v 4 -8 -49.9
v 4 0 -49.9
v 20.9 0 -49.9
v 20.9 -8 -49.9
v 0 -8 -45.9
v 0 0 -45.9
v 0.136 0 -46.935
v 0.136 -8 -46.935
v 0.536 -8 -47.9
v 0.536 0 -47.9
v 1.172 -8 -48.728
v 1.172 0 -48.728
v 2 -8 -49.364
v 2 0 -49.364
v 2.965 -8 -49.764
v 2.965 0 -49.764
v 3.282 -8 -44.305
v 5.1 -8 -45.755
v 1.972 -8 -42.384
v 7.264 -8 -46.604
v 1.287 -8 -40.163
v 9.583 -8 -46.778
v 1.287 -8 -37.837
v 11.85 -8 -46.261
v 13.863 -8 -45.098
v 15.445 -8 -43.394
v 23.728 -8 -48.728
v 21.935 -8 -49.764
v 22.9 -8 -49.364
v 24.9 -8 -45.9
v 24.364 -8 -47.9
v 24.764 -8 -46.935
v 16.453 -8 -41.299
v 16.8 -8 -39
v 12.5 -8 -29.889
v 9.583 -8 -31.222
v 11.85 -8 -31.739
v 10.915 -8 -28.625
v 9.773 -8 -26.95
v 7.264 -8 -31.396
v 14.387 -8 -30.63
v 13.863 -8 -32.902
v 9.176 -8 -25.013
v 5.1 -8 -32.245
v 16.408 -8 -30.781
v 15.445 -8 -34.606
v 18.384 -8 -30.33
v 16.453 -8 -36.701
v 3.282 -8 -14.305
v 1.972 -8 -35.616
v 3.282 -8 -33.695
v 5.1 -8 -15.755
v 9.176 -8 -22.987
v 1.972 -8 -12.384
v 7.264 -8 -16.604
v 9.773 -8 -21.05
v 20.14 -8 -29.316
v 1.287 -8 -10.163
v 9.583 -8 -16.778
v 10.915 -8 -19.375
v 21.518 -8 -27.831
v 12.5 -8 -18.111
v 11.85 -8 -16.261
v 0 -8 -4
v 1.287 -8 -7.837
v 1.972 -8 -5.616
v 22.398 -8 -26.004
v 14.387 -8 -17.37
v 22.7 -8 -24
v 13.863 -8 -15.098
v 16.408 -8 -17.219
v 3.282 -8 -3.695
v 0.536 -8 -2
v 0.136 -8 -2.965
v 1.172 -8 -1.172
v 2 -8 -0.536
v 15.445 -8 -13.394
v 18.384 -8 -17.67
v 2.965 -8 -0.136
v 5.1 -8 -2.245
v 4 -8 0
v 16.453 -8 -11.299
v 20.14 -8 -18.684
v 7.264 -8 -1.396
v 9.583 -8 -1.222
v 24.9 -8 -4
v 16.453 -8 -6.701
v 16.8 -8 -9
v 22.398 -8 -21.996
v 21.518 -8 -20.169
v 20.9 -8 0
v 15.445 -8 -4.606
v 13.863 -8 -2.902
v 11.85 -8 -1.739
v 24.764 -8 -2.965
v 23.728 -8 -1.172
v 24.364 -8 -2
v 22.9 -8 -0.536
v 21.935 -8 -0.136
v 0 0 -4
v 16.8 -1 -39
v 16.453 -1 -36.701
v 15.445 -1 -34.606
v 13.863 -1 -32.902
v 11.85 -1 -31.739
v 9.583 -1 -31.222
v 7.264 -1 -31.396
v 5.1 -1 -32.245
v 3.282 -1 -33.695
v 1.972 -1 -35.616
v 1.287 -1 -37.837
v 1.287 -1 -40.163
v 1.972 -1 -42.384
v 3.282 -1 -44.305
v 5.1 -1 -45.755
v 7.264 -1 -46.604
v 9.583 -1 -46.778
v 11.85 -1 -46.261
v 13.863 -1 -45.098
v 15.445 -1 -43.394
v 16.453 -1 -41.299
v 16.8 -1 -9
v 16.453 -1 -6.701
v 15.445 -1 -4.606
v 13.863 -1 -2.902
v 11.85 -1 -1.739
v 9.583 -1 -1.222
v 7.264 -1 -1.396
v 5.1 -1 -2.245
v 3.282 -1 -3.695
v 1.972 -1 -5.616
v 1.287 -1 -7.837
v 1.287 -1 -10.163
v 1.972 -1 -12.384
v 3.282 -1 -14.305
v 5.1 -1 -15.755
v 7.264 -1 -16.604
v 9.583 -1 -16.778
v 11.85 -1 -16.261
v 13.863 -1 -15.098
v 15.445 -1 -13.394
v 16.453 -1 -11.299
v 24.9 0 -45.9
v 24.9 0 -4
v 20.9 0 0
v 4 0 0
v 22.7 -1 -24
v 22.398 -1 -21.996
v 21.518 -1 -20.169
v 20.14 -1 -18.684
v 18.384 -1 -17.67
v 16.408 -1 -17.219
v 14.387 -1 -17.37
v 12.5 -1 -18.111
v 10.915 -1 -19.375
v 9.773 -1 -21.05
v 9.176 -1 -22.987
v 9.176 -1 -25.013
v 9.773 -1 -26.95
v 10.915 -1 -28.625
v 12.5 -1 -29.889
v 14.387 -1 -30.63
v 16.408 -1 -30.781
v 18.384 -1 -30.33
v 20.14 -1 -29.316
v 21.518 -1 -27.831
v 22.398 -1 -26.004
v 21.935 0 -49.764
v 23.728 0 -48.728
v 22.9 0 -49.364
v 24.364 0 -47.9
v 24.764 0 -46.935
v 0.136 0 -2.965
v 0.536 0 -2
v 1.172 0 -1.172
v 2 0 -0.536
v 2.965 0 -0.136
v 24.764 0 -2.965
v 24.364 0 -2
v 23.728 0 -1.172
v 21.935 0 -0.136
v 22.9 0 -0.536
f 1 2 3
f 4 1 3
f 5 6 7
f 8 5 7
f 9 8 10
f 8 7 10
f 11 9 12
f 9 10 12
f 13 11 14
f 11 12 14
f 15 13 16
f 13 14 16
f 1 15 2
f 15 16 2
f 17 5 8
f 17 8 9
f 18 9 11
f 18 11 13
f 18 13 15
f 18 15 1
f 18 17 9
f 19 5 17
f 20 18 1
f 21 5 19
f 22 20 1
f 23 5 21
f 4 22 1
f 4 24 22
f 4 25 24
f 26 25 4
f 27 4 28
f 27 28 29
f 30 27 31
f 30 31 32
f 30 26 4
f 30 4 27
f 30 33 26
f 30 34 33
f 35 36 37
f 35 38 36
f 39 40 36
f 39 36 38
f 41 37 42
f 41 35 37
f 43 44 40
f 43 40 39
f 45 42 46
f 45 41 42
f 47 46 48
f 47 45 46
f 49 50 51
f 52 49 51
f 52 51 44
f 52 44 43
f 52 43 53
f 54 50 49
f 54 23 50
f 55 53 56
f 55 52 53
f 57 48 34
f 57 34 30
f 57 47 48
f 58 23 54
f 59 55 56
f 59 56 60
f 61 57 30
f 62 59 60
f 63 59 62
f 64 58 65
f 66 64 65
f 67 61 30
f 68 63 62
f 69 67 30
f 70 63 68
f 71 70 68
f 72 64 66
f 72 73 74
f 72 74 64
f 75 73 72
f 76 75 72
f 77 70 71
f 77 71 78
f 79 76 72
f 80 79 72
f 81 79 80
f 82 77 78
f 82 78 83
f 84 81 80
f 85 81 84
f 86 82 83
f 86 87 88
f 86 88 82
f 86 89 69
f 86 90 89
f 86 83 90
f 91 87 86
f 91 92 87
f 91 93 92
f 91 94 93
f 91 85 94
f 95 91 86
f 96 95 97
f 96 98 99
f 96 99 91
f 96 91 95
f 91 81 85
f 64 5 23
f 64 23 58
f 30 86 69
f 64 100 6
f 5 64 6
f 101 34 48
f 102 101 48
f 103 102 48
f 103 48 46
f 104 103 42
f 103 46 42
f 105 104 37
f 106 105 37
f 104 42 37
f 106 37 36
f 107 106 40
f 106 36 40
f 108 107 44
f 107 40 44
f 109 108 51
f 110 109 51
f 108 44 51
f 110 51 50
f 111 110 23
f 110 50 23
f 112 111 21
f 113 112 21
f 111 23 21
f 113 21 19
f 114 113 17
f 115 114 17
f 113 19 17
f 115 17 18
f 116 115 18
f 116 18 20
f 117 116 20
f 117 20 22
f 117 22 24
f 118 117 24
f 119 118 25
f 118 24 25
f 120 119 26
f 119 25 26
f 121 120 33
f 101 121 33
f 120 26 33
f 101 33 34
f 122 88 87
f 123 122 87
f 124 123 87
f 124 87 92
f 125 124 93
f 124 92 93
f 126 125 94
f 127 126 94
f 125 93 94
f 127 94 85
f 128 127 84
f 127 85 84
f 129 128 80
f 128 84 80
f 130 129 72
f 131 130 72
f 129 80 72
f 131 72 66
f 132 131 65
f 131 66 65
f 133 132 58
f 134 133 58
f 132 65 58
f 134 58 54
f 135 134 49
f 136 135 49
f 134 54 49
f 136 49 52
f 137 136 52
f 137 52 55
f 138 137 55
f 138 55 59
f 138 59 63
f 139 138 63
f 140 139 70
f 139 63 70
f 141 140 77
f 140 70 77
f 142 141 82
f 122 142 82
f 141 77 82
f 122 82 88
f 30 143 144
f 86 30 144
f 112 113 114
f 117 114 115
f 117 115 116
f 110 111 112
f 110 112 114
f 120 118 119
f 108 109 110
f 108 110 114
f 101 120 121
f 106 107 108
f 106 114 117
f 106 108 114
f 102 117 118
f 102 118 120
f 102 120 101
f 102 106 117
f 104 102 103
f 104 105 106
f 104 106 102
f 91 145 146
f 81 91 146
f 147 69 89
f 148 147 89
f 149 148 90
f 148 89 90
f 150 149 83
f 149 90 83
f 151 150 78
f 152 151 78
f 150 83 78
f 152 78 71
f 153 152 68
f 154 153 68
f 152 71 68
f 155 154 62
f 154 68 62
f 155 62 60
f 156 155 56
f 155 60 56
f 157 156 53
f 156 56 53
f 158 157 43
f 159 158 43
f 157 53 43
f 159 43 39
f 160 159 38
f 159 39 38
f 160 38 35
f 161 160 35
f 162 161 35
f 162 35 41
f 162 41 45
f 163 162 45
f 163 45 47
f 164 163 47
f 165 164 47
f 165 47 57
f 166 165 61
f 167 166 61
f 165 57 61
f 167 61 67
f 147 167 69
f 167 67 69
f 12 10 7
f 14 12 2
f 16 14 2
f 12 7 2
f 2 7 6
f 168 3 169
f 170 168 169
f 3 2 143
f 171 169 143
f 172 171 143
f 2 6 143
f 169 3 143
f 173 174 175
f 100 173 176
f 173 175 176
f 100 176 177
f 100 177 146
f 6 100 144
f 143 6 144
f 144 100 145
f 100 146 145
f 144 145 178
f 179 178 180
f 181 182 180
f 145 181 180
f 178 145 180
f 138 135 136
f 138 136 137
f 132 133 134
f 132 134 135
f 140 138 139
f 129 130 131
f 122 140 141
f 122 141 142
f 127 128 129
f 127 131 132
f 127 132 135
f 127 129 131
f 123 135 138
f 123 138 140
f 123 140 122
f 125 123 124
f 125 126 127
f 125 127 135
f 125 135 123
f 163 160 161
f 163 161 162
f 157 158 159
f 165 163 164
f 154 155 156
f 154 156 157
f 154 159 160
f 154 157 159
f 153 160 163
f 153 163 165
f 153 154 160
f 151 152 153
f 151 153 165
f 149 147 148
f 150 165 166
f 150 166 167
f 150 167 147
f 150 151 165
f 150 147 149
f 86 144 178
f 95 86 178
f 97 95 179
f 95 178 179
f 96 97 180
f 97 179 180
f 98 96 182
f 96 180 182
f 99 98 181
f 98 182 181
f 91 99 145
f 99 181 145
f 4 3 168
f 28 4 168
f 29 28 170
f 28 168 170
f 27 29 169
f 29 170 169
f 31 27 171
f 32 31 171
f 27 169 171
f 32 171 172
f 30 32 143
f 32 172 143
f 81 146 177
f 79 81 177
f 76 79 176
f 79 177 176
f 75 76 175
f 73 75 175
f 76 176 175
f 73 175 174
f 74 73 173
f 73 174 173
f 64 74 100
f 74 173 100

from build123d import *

# Parameters (mm, degrees)
F1_DEPTH = 8
F2_R     = 7.8
F2_R_2   = 6.8
F3_DEPTH = 7


with BuildPart() as f1:
    # F0 (on Front) → F1 (new body)
    with BuildSketch(Plane.XZ):
        with BuildLine():
            Line((20.9, 0), (4, 0))
            ThreePointArc((4, 0), (1.171573, -1.171573), (0, -4))
            Line((0, -4), (0, -45.9))
            ThreePointArc((0, -45.9), (1.171573, -48.728427), (4, -49.9))
            Line((4, -49.9), (20.9, -49.9))
            ThreePointArc((20.9, -49.9), (23.728427, -48.728427), (24.9, -45.9))
            Line((24.9, -45.9), (24.9, -4))
            ThreePointArc((24.9, -4), (23.728427, -1.171573), (20.9, 0))
        make_face()
    extrude(amount=F1_DEPTH)

    # F2 (on face) → F3 (cut)
    with BuildSketch(Plane.XZ.offset(8)):
        with Locations((9, -9)):
            Circle(F2_R)
        with Locations((15.9, -24)):
            Circle(F2_R_2)
        with Locations((9, -39)):
            Circle(F2_R)
    extrude(amount=-F3_DEPTH, mode=Mode.SUBTRACT)


solid = f1.part
